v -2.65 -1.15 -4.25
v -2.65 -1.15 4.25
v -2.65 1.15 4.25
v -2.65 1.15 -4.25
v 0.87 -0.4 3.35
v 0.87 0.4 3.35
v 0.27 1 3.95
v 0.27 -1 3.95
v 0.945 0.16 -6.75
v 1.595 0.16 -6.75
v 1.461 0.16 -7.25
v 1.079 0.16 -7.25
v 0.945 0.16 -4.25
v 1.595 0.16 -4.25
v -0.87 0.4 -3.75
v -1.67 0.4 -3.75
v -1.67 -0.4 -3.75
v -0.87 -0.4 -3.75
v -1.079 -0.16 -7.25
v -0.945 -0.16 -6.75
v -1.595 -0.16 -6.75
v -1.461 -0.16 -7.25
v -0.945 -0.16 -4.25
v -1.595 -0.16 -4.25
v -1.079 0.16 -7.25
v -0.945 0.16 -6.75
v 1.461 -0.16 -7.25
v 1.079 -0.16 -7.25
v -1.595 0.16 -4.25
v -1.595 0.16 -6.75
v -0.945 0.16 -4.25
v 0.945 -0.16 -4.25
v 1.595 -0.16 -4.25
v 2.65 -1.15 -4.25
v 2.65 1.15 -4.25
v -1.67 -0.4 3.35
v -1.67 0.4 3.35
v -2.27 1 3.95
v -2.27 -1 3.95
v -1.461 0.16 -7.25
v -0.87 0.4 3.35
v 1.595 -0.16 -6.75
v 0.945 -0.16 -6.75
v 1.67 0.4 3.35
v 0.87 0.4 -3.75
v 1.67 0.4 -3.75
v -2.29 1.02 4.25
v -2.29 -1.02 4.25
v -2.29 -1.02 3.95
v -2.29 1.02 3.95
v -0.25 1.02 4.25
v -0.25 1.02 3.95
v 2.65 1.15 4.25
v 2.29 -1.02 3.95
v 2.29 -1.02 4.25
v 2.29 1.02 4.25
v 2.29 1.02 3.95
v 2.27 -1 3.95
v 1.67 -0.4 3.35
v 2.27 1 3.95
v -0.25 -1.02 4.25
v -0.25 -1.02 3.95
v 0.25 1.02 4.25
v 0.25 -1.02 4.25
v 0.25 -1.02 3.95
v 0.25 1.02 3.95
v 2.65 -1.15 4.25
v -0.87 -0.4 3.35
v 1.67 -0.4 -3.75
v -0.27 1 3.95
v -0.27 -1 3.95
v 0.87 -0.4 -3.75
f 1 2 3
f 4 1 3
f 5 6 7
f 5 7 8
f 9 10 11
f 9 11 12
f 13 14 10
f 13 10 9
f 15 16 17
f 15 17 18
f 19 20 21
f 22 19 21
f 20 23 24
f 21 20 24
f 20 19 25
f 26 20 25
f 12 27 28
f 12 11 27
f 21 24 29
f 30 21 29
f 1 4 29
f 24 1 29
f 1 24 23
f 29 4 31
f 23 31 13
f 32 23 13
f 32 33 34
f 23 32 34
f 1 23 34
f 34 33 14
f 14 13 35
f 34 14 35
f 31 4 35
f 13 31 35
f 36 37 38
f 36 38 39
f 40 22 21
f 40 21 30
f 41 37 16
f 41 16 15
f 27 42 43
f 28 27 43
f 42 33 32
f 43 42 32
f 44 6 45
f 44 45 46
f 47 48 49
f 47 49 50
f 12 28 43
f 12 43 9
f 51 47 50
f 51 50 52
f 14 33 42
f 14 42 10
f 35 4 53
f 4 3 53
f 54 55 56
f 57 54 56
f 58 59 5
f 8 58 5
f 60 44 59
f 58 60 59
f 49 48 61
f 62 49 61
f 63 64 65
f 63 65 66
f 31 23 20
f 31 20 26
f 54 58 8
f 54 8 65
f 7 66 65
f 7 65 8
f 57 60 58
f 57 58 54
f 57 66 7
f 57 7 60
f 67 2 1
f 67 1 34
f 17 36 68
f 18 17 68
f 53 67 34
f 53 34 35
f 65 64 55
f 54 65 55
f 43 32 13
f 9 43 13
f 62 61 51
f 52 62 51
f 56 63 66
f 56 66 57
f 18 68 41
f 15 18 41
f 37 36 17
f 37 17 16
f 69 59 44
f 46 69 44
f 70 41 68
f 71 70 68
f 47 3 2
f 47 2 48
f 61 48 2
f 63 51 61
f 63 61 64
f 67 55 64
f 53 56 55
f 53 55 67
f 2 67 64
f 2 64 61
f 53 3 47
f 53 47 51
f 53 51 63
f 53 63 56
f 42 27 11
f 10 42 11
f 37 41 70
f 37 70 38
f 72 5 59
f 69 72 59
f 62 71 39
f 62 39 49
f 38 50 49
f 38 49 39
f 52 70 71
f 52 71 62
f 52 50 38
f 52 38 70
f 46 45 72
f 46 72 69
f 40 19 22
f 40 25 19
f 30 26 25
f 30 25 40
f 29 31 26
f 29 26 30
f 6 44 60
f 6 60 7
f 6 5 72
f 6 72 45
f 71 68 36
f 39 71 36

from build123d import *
from OCP.BRepFilletAPI import BRepFilletAPI_MakeChamfer

# Parameters (mm, degrees)
SKETCH_1_W          = 5.3
SKETCH_1_H          = 2.3
EXTRUDE_1_DEPTH     = 4.25
SKETCH_2_W          = 0.8
SKETCH_2_H          = 0.8
CUT_EXTRUDE_1_DEPTH = 8
SKETCH_3_W          = 2.04
SKETCH_3_H          = 2.04
CUT_EXTRUDE_2_DEPTH = 0.3
CHAMFER_1_SIZE      = 0.6
SKETCH_4_W          = 0.65
SKETCH_4_H          = 0.32
EXTRUDE_2_DEPTH     = 3
CHAMFER_2_SIZE      = 0.5
CHAMFER_2_SIZE2     = 0.133974596


with BuildPart() as part:
    # 草图1 → 凸台-拉伸1 (new, symmetric)
    with BuildSketch(Plane.XY):
        Rectangle(SKETCH_1_W, SKETCH_1_H)
    extrude(amount=EXTRUDE_1_DEPTH, both=True)

    # 草图2 → 切除-拉伸1 (cut)
    with BuildSketch(Plane.XY.offset(4.25)):
        with Locations((-1.27, 0)):
            Rectangle(SKETCH_2_W, SKETCH_2_H)
        with Locations((1.27, 0)):
            Rectangle(SKETCH_2_W, SKETCH_2_H)
    extrude(amount=-CUT_EXTRUDE_1_DEPTH, mode=Mode.SUBTRACT)

    # 草图3 → 切除-拉伸2 (cut)
    with BuildSketch(Plane.XY.offset(4.25)):
        with Locations((-1.27, 0)):
            Rectangle(SKETCH_3_W, SKETCH_3_H)
        with Locations((1.27, 0)):
            Rectangle(SKETCH_3_W, SKETCH_3_H)
    extrude(amount=-CUT_EXTRUDE_2_DEPTH, mode=Mode.SUBTRACT)

    # 倒角1
    chamfer_1_edges = [part.edges().sort_by_distance(p)[0] for p in [
        (-1.27, -0.4, 3.95),
        (1.27, -0.4, 3.95),
        (-1.67, 0, 3.95),
        (-1.27, 0.4, 3.95),
        (-0.87, 0, 3.95),
        (1.27, 0.4, 3.95),
        (0.87, 0, 3.95),
        (1.67, 0, 3.95),
    ]]
    chamfer(chamfer_1_edges, length=CHAMFER_1_SIZE)

    # 草图4 → 凸台-拉伸2 (add)
    with BuildSketch(Plane(origin=(0, 0, -4.25), x_dir=(-1, 0, 0), z_dir=(0, 0, -1))):
        with Locations((-1.27, 0)):
            Rectangle(SKETCH_4_W, SKETCH_4_H)
        with Locations((1.27, 0)):
            Rectangle(SKETCH_4_W, SKETCH_4_H)
    extrude(amount=EXTRUDE_2_DEPTH)

    # 倒角2: one chamfer whose edges measure the first distance from different faces: ONE call of the kernel's chamfer builder (chamfer() names one face for all edges)
    chamfer_2_edges_1 = [part.edges().sort_by_distance(p)[0] for p in [
        (1.595, 0, -7.25),
    ]]
    chamfer_2_side_1 = [part.faces().sort_by_distance(p)[0] for p in [
        (1.595, 0, -5.75),
    ]]
    chamfer_2_edges_2 = [part.edges().sort_by_distance(p)[0] for p in [
        (0.945, 0, -7.25),
    ]]
    chamfer_2_side_2 = [part.faces().sort_by_distance(p)[0] for p in [
        (0.945, 0, -5.75),
    ]]
    chamfer_2_edges_3 = [part.edges().sort_by_distance(p)[0] for p in [
        (-0.945, 0, -7.25),
    ]]
    chamfer_2_side_3 = [part.faces().sort_by_distance(p)[0] for p in [
        (-0.945, 0, -5.75),
    ]]
    chamfer_2_edges_4 = [part.edges().sort_by_distance(p)[0] for p in [
        (-1.595, 0, -7.25),
    ]]
    chamfer_2_side_4 = [part.faces().sort_by_distance(p)[0] for p in [
        (-1.595, 0, -5.75),
    ]]
    chamfer_2 = BRepFilletAPI_MakeChamfer(part.part.solid().wrapped)
    for e in chamfer_2_edges_1:
        chamfer_2.Add(CHAMFER_2_SIZE, CHAMFER_2_SIZE2, e.wrapped, chamfer_2_side_1[0].wrapped)  # the first distance lies on this face
    for e in chamfer_2_edges_2:
        chamfer_2.Add(CHAMFER_2_SIZE, CHAMFER_2_SIZE2, e.wrapped, chamfer_2_side_2[0].wrapped)  # the first distance lies on this face
    for e in chamfer_2_edges_3:
        chamfer_2.Add(CHAMFER_2_SIZE, CHAMFER_2_SIZE2, e.wrapped, chamfer_2_side_3[0].wrapped)  # the first distance lies on this face
    for e in chamfer_2_edges_4:
        chamfer_2.Add(CHAMFER_2_SIZE, CHAMFER_2_SIZE2, e.wrapped, chamfer_2_side_4[0].wrapped)  # the first distance lies on this face
    add(Compound.cast(chamfer_2.Shape()), mode=Mode.REPLACE)


solid = part.part
